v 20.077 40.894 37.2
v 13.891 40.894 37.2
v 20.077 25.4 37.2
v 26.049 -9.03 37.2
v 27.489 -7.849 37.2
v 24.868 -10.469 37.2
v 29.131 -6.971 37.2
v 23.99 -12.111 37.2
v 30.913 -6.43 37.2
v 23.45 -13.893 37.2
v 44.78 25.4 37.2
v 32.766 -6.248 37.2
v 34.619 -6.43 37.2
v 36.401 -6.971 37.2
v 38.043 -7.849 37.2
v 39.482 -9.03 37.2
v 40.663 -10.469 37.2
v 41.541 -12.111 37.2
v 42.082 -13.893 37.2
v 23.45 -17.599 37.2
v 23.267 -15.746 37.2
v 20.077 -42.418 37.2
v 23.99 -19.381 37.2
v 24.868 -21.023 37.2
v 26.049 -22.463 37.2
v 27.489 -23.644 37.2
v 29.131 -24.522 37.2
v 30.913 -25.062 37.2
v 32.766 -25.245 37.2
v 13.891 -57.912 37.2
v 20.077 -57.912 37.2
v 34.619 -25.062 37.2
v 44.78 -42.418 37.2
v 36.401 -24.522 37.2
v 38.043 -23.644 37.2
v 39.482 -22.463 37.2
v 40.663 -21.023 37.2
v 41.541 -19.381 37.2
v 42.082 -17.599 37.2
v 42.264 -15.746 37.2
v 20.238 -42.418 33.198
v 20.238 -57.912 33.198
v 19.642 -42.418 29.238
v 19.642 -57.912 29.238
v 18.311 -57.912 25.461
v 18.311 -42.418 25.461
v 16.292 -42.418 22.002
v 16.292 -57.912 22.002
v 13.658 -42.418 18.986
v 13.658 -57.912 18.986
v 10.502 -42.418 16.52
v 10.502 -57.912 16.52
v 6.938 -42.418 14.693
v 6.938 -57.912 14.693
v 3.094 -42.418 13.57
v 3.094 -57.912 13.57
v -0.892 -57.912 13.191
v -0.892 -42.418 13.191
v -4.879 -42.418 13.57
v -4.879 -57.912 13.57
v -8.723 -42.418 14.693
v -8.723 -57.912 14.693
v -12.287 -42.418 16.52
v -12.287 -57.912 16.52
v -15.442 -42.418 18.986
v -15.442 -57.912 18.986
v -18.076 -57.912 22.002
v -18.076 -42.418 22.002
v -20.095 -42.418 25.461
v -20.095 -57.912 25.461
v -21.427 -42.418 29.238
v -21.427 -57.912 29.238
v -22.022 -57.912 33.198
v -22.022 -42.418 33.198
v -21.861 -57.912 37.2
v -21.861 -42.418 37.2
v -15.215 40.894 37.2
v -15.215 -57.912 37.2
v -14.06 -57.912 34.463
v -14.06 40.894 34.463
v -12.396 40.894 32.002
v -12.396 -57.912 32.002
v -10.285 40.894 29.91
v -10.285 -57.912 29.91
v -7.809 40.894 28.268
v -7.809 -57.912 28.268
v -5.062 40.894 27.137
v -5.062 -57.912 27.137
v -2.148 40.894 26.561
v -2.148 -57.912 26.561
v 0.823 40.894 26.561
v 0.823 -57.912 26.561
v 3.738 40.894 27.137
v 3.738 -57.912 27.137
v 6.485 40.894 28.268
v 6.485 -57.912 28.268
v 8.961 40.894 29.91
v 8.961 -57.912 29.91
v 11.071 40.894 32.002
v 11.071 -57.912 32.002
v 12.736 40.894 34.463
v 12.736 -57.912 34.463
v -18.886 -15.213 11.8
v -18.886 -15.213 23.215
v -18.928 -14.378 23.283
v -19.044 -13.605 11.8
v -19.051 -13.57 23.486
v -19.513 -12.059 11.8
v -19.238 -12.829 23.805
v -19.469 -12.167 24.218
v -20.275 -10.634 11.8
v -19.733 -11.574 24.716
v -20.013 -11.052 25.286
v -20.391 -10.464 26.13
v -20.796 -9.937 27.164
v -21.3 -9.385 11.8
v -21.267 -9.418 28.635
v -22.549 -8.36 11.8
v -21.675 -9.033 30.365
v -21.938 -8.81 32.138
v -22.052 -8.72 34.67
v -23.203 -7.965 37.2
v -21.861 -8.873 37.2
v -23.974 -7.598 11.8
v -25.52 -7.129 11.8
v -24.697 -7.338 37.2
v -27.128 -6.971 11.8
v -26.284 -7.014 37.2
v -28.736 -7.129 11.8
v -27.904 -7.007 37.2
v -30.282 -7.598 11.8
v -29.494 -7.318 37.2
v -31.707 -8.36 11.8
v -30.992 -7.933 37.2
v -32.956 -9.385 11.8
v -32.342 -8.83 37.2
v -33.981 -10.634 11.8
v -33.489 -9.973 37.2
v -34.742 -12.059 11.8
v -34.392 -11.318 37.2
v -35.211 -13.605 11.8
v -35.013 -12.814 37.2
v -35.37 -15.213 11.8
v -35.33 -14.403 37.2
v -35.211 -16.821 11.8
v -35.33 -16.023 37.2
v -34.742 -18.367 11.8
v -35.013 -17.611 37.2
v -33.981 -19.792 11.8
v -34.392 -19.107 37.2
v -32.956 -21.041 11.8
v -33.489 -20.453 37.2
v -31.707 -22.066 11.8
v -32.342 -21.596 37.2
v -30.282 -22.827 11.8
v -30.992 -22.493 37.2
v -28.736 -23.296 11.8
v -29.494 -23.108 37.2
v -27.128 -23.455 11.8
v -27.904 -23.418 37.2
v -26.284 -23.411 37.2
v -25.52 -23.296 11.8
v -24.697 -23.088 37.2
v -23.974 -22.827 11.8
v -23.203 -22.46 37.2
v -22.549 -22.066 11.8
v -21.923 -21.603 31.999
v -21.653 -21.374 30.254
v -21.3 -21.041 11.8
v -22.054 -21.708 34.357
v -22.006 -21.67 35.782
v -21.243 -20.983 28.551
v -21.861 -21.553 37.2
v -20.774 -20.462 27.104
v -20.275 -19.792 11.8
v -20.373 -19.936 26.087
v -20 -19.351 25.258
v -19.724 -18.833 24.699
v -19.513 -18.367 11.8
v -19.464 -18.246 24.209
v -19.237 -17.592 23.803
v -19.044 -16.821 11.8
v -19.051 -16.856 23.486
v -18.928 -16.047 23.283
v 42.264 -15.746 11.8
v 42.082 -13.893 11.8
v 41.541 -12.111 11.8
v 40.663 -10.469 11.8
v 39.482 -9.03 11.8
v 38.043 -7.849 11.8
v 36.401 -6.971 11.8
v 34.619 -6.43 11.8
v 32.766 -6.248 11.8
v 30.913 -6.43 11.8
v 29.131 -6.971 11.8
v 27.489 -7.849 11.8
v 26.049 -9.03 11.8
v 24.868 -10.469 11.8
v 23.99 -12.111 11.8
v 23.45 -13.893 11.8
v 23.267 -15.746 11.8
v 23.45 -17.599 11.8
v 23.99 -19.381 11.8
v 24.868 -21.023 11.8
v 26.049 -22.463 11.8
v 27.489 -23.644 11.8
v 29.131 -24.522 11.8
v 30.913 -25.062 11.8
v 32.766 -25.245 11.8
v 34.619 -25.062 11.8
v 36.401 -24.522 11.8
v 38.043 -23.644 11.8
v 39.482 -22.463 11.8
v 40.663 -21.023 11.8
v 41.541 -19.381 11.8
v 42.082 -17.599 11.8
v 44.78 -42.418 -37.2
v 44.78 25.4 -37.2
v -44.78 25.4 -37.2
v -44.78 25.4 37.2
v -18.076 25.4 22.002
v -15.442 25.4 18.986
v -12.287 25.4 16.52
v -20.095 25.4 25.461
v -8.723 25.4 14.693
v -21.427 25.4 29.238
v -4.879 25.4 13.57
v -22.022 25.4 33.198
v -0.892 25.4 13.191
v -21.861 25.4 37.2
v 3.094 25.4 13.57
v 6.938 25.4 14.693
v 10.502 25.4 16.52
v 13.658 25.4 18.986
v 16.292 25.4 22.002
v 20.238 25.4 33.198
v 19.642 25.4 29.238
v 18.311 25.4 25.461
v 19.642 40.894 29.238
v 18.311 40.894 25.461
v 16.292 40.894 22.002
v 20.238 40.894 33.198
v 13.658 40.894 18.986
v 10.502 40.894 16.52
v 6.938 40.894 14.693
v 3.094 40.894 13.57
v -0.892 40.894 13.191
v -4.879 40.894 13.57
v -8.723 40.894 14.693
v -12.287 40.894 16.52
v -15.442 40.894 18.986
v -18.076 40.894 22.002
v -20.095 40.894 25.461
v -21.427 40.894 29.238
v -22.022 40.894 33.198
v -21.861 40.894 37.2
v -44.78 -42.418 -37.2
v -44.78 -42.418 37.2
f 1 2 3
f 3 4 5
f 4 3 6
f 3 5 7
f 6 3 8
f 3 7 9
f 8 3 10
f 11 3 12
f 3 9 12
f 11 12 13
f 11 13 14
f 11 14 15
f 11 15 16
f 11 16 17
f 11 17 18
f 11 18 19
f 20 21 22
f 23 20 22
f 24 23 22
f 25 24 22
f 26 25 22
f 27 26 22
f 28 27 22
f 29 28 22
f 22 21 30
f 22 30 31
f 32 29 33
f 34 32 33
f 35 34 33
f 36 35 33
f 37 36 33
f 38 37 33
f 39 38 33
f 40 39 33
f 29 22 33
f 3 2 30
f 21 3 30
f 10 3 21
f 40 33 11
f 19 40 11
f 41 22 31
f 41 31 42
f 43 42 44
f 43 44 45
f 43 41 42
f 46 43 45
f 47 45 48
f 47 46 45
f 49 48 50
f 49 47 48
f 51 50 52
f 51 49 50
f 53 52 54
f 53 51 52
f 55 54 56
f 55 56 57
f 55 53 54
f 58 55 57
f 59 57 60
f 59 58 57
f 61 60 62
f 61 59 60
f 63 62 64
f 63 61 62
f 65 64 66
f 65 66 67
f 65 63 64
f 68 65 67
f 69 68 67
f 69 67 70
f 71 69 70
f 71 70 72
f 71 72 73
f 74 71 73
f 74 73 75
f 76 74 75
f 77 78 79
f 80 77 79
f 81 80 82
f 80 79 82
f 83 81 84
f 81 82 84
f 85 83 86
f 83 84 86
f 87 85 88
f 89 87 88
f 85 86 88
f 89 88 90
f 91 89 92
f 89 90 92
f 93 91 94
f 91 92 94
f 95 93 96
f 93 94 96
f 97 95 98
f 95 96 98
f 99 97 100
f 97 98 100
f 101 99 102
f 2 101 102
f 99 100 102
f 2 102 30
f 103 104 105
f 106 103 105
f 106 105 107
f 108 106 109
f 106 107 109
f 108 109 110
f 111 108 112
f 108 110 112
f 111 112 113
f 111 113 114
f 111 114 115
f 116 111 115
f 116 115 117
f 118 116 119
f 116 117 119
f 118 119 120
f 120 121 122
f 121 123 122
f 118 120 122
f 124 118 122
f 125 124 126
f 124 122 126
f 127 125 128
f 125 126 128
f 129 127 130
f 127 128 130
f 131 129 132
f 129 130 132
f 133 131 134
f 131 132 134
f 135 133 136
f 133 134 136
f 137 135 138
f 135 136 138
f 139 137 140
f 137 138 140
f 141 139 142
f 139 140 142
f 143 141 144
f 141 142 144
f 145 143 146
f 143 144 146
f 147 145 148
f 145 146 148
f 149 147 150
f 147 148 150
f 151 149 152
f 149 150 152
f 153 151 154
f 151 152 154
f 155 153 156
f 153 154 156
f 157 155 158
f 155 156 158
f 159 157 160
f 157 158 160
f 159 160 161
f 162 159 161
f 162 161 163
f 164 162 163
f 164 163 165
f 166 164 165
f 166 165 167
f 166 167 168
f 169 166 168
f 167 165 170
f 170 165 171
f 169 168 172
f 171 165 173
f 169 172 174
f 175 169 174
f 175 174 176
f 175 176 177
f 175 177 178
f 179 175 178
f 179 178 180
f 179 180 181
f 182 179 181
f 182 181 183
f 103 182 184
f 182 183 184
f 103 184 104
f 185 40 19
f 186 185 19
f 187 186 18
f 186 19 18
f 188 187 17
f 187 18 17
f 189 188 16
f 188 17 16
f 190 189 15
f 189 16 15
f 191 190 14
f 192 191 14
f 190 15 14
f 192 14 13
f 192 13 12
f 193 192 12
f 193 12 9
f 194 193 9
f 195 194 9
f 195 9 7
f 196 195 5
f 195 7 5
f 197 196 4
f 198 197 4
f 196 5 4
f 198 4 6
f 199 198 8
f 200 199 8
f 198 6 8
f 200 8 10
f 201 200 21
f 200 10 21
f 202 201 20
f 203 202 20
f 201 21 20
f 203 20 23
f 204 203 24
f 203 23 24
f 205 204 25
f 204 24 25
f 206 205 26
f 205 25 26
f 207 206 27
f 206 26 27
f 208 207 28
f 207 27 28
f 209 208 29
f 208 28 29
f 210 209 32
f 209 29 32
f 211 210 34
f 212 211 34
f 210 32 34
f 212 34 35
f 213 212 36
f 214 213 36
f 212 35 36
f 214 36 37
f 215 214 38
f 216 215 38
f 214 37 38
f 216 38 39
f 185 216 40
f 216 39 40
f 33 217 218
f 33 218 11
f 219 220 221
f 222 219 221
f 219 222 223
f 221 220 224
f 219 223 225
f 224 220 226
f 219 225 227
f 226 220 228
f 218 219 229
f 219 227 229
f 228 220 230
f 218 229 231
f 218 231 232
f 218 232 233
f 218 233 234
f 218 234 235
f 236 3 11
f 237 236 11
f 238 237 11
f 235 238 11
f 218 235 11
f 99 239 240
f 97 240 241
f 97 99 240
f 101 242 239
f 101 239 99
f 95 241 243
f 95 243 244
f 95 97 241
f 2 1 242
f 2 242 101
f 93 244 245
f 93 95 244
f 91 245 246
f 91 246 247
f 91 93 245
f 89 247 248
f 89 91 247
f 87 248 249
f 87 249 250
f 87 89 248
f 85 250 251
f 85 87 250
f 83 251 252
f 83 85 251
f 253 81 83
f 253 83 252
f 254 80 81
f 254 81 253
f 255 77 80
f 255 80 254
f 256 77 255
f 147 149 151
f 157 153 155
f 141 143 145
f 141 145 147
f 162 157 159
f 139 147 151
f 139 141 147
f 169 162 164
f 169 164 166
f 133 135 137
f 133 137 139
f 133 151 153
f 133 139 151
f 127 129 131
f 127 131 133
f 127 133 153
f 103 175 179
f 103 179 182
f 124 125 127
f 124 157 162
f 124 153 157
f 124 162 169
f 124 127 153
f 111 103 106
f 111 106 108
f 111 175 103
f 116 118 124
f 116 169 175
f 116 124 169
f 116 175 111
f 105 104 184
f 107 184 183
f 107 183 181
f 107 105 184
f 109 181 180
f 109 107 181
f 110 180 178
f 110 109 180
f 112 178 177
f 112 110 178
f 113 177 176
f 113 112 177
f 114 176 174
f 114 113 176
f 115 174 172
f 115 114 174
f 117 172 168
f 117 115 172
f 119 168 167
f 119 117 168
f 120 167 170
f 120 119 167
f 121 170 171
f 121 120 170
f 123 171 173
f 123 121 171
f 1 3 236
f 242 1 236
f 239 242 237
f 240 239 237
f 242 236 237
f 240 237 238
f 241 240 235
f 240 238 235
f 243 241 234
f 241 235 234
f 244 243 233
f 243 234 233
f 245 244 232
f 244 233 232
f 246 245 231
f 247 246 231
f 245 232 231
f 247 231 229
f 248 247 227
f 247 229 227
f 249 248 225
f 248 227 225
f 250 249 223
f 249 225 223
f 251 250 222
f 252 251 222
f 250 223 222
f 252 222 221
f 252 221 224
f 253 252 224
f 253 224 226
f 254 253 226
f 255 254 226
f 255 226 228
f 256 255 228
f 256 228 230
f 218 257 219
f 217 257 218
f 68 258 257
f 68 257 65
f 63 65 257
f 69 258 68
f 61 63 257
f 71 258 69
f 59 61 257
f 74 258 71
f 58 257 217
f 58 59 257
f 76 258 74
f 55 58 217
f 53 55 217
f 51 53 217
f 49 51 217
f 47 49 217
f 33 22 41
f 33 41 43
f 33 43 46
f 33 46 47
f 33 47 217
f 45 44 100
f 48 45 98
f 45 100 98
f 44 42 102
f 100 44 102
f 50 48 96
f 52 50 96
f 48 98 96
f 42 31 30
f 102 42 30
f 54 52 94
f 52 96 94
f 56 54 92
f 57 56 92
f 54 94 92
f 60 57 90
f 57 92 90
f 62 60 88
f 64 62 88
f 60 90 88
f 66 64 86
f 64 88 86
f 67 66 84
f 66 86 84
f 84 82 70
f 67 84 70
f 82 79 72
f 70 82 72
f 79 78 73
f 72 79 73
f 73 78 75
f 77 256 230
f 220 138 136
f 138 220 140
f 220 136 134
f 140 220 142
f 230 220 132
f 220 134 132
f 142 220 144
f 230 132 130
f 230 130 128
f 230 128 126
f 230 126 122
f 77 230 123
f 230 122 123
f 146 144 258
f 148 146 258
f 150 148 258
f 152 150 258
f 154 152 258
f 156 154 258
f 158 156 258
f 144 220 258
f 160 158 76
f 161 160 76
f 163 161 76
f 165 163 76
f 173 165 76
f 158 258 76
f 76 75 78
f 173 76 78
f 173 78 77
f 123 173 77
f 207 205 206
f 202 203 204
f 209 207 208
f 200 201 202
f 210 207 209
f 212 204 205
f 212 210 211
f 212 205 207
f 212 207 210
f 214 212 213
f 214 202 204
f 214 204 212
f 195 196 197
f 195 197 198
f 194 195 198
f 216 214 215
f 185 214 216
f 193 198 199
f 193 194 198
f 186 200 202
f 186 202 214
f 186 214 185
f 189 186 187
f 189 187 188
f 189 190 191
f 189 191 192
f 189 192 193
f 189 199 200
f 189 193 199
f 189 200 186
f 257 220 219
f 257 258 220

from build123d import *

# Parameters (mm, degrees)
F1_DEPTH = 42.418
F2_DEPTH = 25.4
F3_R     = 8.2419293277
F3_R_2   = 9.4983562565
F4_DEPTH = 25.4
F6_DEPTH = 15.494
F7_DEPTH = 98.806


with BuildPart() as f1:
    # F0 (on Front) → F1 (new body)
    with BuildSketch(Plane.XZ):
        with BuildLine():
            Line((-44.7798408568, -37.1997542679), (44.7798408568, -37.1997542679))
            Line((44.7798408568, -37.1997542679), (44.7798408568, 37.1997542679))
            Line((44.7798408568, 37.1997542679), (13.8912415132, 37.1997542679))
            ThreePointArc((13.8912415132, 37.1997542679), (-0.6620394997, 26.4881938236), (-15.2153205127, 37.1997542679))
            Line((-15.2153205127, 37.1997542679), (-44.7798408568, 37.1997542679))
            Line((-44.7798408568, 37.1997542679), (-44.7798408568, -37.1997542679))
        make_face()
    extrude(amount=F1_DEPTH)

    # F2 (add): a face of the model
    f2_faces = [f1.faces().sort_by_distance(p)[0] for p in [
        (0.023550187, 0, -1.1650746178),
    ]]
    extrude(f2_faces, amount=F2_DEPTH)

    # F3 (on face) → F4 (cut)
    with BuildSketch(Plane.XY.offset(37.1997542679)):
        with Locations((-27.1278675646, -15.2127910405)):
            Circle(F3_R)
        with Locations((32.7657014132, -15.7461762428)):
            Circle(F3_R_2)
    extrude(amount=-F4_DEPTH, mode=Mode.SUBTRACT)

    # F5 (on face) → F6 (join)
    with BuildSketch(Plane(origin=(0, 25.4, 0), x_dir=(-1, 0, 0), z_dir=(0, 1, 0))):
        with BuildLine():
            Line((-13.8912415132, 37.1997542679), (-20.0768597424, 37.1997542679))
            ThreePointArc((-20.0768597424, 37.1997542679), (0.892303884, 13.1906008043), (21.8614675105, 37.1997542679))
            Line((21.8614675105, 37.1997542679), (15.2153205127, 37.1997542679))
            ThreePointArc((15.2153205127, 37.1997542679), (0.6620394997, 26.4881938236), (-13.8912415132, 37.1997542679))
        make_face()
    extrude(amount=F6_DEPTH)

    # F7 (add): a face of the model
    f7_faces = [f1.faces().sort_by_distance(p)[0] for p in [
        (-0.9809266979, 40.894, 24.6318150019),
    ]]
    extrude(f7_faces, amount=-F7_DEPTH)


solid = f1.part
